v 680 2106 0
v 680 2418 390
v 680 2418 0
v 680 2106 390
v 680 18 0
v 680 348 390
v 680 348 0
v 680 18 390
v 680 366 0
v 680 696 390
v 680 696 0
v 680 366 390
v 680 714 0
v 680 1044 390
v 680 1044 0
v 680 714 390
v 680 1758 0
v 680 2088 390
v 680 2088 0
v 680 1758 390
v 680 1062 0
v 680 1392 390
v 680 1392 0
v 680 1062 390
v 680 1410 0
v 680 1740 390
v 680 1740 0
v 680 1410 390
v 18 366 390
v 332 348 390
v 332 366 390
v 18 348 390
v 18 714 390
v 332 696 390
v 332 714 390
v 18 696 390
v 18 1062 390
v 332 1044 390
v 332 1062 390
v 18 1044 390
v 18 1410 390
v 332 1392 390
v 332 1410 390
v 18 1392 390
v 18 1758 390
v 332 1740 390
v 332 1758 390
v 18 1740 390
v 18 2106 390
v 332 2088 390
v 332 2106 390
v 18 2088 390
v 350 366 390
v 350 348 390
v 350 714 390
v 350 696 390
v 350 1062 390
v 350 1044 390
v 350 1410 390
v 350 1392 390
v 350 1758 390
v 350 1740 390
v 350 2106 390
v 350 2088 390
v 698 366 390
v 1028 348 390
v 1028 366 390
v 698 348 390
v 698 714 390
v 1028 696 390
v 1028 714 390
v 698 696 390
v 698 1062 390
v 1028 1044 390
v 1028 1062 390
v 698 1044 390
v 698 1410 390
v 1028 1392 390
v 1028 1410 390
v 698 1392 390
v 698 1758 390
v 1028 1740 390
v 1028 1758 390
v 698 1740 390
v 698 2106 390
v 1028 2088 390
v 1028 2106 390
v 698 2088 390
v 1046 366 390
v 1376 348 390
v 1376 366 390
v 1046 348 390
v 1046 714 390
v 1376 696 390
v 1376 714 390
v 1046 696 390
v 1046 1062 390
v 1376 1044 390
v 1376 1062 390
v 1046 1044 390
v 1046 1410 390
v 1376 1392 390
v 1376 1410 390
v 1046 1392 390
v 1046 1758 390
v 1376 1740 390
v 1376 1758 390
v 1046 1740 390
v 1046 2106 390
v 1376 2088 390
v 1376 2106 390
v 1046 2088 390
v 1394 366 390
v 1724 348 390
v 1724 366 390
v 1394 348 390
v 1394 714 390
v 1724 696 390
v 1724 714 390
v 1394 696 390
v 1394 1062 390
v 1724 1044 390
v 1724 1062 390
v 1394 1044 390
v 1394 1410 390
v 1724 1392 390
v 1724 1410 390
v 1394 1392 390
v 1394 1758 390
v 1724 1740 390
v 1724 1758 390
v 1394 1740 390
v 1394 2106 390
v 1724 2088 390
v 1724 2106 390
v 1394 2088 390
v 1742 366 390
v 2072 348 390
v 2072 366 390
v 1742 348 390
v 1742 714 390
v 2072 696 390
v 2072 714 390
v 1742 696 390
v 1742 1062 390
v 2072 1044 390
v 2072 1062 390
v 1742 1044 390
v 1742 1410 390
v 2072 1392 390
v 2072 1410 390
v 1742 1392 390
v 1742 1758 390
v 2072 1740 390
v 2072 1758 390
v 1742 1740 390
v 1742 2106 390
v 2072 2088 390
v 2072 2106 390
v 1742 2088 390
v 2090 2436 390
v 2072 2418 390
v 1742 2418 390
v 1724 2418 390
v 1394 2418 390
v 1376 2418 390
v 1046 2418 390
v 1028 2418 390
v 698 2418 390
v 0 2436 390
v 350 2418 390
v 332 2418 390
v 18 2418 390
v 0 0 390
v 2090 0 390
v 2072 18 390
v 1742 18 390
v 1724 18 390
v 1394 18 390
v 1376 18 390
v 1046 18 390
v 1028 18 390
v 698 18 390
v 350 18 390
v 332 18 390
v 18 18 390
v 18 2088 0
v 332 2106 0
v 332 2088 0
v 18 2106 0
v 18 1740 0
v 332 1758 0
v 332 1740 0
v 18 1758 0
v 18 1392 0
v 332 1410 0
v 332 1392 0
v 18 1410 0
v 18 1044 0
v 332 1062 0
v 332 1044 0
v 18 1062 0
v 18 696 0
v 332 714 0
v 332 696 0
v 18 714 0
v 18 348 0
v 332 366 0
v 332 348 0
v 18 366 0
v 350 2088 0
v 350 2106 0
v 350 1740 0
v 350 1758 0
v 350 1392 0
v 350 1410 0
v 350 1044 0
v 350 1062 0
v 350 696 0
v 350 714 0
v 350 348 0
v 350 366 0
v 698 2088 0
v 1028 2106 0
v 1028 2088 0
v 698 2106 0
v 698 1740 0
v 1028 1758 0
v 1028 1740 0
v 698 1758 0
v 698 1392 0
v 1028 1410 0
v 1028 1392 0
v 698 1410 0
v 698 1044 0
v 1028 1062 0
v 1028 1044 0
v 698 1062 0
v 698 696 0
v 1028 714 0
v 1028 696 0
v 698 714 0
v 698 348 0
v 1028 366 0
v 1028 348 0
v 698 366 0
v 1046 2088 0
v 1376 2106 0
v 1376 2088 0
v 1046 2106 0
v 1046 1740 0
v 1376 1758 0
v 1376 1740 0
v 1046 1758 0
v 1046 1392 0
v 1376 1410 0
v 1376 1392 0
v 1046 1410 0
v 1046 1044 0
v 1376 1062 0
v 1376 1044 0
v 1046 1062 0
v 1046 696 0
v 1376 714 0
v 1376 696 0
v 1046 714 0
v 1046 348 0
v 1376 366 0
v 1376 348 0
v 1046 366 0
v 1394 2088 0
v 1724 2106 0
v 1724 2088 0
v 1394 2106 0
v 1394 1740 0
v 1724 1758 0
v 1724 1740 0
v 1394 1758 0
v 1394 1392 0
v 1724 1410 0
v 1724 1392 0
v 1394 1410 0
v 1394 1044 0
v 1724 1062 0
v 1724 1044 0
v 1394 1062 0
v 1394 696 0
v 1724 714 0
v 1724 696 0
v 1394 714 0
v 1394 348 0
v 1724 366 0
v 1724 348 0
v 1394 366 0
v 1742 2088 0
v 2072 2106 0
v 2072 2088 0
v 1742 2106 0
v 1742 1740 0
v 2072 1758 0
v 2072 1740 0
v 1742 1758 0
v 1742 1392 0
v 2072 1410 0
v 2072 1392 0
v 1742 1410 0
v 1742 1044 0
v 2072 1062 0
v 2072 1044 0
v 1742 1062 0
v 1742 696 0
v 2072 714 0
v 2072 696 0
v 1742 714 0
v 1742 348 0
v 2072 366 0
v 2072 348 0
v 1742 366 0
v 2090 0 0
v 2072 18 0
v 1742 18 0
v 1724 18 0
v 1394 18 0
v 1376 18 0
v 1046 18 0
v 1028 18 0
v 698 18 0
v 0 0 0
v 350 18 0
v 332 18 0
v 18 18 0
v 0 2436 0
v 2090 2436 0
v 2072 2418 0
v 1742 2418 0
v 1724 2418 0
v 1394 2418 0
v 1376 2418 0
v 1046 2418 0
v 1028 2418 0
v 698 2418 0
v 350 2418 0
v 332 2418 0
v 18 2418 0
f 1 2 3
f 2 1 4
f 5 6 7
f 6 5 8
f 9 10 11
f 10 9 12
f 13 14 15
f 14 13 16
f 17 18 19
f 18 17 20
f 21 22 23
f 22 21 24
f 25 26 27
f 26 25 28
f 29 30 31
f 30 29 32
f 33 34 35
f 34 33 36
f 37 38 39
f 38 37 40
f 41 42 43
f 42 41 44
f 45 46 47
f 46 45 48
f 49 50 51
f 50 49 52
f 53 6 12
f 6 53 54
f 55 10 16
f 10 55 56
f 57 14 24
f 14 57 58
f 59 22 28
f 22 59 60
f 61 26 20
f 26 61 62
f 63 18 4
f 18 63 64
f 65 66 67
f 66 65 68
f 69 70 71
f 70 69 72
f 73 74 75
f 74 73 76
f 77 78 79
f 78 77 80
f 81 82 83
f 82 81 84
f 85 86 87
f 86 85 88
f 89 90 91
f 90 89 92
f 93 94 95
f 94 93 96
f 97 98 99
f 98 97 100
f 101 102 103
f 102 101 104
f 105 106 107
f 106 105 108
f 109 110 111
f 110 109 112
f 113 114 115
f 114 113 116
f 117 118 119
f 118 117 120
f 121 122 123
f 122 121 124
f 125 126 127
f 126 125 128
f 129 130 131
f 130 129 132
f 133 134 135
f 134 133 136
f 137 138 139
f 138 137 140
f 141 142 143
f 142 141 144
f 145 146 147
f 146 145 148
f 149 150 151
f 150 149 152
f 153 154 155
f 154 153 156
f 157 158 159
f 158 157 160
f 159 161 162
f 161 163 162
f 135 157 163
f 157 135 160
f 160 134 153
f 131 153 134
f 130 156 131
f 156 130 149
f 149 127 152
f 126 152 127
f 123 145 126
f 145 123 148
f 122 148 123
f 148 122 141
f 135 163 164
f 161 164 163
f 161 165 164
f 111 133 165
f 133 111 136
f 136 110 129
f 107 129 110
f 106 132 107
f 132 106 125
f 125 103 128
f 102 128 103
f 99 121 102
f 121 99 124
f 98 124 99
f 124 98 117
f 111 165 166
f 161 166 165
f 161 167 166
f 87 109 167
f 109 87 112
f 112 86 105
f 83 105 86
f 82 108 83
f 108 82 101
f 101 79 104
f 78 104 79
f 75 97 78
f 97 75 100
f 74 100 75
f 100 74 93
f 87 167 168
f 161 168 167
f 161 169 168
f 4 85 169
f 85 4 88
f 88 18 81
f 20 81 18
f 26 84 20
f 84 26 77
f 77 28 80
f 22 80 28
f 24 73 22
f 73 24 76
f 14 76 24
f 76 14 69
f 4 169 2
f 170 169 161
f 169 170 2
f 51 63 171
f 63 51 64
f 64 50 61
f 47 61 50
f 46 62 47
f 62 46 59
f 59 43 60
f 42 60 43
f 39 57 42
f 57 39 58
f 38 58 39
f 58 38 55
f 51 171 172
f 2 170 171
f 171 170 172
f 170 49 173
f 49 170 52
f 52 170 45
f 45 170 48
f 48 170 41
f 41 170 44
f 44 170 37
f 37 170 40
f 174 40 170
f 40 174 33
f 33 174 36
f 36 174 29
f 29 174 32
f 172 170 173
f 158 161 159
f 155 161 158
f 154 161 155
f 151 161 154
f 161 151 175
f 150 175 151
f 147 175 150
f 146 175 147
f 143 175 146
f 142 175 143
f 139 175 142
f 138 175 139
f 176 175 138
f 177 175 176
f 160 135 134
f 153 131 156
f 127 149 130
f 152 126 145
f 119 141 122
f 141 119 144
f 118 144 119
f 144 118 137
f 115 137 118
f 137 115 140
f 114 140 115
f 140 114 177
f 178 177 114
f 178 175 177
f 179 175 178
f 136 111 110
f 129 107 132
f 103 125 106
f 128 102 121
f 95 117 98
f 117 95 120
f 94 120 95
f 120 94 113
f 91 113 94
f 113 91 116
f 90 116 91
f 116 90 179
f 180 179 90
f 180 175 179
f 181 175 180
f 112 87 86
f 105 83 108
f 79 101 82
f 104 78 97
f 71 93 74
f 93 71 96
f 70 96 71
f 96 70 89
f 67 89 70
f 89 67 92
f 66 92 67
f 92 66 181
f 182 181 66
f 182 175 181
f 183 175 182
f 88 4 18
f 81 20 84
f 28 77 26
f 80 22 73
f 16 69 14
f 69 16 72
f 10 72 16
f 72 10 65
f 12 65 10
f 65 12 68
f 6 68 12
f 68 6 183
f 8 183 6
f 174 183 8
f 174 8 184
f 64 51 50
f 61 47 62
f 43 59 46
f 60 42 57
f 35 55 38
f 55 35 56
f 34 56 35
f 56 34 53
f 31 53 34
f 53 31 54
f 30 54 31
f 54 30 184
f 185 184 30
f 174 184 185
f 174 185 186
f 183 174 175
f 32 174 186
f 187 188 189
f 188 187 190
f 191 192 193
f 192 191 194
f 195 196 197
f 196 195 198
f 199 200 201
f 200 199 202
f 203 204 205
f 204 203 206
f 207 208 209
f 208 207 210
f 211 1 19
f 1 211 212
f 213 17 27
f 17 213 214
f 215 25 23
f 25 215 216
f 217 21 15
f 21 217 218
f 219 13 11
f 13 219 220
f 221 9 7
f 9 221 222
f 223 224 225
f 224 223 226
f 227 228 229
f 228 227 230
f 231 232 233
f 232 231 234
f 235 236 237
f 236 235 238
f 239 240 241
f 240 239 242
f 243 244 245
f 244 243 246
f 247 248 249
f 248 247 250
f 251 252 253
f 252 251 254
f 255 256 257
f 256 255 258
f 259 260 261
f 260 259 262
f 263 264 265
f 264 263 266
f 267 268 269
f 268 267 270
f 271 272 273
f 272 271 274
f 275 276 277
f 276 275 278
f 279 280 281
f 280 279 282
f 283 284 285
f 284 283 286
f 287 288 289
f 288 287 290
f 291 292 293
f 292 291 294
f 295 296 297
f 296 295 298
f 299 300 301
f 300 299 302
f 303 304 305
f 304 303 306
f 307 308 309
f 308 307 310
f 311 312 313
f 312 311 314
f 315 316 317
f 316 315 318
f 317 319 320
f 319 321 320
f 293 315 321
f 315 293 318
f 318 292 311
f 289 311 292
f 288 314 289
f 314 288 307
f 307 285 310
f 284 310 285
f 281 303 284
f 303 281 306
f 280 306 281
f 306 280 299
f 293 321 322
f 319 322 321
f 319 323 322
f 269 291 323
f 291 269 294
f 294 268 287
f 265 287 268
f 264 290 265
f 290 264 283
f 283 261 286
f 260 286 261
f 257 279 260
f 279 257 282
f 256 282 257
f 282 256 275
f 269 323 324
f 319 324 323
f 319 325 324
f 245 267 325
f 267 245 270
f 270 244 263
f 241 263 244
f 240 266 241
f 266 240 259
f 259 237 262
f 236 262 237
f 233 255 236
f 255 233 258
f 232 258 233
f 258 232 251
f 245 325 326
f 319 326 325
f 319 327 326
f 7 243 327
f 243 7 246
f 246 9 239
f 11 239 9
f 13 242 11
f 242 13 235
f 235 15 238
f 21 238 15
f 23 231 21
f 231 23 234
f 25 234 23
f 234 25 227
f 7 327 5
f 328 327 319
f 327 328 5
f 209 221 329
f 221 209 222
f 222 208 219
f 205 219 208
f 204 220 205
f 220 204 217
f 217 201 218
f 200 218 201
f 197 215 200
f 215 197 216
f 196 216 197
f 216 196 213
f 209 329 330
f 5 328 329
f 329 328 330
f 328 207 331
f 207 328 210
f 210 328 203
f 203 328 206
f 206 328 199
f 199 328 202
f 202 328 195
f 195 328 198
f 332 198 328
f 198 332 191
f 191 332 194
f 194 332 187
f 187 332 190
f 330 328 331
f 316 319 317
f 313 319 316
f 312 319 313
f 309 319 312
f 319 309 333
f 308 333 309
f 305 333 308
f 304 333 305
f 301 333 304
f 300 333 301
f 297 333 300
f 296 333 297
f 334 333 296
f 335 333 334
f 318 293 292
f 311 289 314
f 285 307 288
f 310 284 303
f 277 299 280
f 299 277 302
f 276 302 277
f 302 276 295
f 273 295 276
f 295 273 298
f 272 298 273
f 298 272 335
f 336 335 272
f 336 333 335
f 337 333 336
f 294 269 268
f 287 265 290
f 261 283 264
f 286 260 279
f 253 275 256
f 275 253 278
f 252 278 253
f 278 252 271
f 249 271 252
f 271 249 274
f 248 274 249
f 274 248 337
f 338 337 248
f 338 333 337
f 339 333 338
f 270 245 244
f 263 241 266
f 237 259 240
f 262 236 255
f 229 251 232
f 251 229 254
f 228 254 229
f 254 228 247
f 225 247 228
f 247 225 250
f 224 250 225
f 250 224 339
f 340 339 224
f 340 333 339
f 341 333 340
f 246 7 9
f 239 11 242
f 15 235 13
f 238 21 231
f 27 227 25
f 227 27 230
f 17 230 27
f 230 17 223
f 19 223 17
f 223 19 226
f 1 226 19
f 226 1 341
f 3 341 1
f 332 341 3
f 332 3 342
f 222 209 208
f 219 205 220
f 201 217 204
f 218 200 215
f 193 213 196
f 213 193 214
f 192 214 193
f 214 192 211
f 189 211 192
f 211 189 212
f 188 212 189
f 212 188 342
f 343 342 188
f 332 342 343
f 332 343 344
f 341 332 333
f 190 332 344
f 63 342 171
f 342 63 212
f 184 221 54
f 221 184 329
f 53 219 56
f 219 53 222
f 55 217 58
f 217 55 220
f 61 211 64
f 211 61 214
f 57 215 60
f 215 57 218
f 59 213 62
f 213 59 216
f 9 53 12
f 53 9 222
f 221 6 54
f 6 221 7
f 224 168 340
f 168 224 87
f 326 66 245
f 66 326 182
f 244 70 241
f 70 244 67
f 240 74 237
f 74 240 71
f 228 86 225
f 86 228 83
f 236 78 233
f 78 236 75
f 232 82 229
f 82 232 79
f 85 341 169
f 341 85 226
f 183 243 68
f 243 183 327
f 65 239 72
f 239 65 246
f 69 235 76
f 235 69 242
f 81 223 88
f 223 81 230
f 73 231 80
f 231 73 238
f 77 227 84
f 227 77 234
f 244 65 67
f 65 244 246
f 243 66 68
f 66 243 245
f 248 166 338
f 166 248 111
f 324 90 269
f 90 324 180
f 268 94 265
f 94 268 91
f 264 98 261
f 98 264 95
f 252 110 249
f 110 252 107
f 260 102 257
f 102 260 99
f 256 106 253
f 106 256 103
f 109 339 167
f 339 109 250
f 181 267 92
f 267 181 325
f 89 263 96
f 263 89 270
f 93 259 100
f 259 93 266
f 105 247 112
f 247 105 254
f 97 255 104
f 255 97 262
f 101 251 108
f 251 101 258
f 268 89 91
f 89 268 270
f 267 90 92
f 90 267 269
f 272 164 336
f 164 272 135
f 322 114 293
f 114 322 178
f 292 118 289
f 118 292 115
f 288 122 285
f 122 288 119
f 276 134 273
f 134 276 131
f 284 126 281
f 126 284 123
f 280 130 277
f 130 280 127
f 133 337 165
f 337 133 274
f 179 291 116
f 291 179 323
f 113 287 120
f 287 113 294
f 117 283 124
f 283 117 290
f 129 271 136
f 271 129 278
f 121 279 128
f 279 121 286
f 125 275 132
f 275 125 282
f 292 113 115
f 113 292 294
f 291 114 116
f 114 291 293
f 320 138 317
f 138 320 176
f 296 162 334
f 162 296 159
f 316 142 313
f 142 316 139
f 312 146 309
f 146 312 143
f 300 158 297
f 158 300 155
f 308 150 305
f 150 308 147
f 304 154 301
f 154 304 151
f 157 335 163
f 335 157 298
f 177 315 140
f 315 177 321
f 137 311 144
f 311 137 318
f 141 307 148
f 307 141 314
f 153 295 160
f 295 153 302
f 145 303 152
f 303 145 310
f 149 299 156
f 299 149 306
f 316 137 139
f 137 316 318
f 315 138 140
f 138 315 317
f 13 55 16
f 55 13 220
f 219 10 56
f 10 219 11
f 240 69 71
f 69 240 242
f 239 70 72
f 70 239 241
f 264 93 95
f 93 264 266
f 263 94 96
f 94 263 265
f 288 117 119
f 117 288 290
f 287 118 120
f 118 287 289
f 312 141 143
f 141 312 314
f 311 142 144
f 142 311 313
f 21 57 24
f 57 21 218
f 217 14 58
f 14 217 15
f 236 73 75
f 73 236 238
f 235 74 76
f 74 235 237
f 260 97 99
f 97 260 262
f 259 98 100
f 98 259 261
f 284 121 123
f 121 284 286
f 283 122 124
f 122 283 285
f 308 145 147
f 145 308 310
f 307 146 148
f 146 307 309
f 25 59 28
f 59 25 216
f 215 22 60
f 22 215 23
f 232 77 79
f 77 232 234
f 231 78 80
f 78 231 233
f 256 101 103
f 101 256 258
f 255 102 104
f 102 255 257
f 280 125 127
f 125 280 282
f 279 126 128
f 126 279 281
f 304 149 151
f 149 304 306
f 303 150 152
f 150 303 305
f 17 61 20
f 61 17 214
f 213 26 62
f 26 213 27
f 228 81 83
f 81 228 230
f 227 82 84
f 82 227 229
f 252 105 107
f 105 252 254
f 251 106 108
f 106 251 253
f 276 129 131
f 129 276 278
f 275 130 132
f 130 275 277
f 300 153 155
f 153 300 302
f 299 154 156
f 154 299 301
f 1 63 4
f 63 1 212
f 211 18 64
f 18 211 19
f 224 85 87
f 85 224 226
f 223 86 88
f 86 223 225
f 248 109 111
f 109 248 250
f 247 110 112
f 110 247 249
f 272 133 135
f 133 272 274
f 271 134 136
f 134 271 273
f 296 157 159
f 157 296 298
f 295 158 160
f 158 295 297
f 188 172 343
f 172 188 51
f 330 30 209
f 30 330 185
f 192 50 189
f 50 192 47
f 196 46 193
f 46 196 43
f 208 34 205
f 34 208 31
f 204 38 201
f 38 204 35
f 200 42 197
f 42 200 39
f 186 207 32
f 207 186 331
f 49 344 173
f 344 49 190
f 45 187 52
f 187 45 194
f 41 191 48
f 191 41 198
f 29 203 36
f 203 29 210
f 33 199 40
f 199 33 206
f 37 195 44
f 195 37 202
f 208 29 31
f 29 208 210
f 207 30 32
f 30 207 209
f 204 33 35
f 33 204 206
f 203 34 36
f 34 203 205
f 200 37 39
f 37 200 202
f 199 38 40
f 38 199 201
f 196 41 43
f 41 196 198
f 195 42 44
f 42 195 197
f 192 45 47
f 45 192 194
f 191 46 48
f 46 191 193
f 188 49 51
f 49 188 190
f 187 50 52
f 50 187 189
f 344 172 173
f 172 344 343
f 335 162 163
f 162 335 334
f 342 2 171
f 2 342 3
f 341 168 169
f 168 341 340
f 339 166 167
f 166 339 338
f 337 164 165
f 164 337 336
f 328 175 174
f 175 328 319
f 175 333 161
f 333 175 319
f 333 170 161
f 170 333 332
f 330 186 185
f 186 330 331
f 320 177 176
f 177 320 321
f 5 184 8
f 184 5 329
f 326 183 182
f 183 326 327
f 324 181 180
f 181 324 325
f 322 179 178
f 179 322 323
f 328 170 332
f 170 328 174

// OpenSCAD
rowHeight = 18;
boxSize = 330;
depth = 390;

paddingLeft = 314;

rows = 7;
columuns = 6;

// Calculate horizontal size lenght
horizontalLenght = rowHeight+(boxSize*columuns)+(columuns-2)*rowHeight;
totalH = (paddingLeft == 0) ? horizontalLenght : (horizontalLenght - boxSize + paddingLeft);

// Calculate vertical size
totalV = rows*boxSize + (rows-1)*rowHeight;

// Horizontal top and bottom
translate([rowHeight, 0])
	cube([totalH, rowHeight, depth], false);
translate([rowHeight, totalV])
	cube([totalH, rowHeight, depth], false);
	
// Calculate the number of standard size plates
platesPerRow = (paddingLeft > 0) ? columuns - 1 : columuns;
// Horizontal
for ( row = [1 : rows-1] ) {
	// the first box is with different size if left padding is greater than 0
	startX = (paddingLeft > 0) ? paddingLeft+2*rowHeight : rowHeight;
	translate([rowHeight, (row*(boxSize+rowHeight))])
		// Custom plate if there is left padding
		if (paddingLeft > 0) {
			cube([paddingLeft, rowHeight, depth], false);
		}
		// Plates per row with the standard size
		if (platesPerRow > 0) {
			for ( box = [0 : platesPerRow-1] ) {
				translate([(startX+box*(boxSize+rowHeight)), (row*(boxSize+rowHeight))])
					cube([boxSize, rowHeight, depth], false);
			}
		}
	}

// Vertical columns
// The first vertical side
cube([rowHeight, totalV+rowHeight, depth], false);
// Next vertical sides
verticalStartX = (paddingLeft > 0) ? paddingLeft + rowHeight : boxSize + rowHeight;
for ( v = [0 : columuns-1] ) {
	colHeight = (v == columuns-1) ? totalV + rowHeight: totalV;
	colStartY = (v == columuns-1) ? 0: rowHeight;
    translate([verticalStartX+(v*(boxSize+rowHeight)), 0])
		cube([rowHeight, colHeight, depth], false);
}

// Calculate the total are and estimate min material pieces
area = (totalH*depth*2 + totalV*depth*(columuns+1)+boxSize*boxSize*rows*(columuns-1)+302*boxSize*rows);
material = 3660*1830;
materialCount = area/material;

echo("----------------------------------------");
echo("Rows: ", rows);
echo("Columns: ", columuns);
echo("Boxes: ", rows*columuns);
echo("----------------------------------------");
echo("Furniture width: ", totalH+(2*rowHeight));
// Total height is the vertical size + twice the material height
totalFurnitureHeight = totalV+2*rowHeight;
echo("Furniture height: ", totalV+2*rowHeight);
echo("Max furniture diagonal height: ", sqrt(totalFurnitureHeight*totalFurnitureHeight+depth*depth));
echo("----------------------------------------");
echo("Horizontal planes A", totalH, "x", depth, "mm: ", 2);
echo("Vertical planes sides ", totalV+2*rowHeight, "x", depth, "mm: ", 2);
echo("Vertical planes middle ", totalV, "x", depth, "mm: ", columuns-1);
echo("Horizontal planes B", boxSize, "x", depth, "mm: ", (rows-1)*(columuns-1));
echo("Horizontal planes C", paddingLeft, "x", depth, "mm: ", rows-1);
echo("----------------------------------------");
echo("Joint plates: ", ((columuns+1)*(rows-1)));
echo("Dowels: ", 2*((columuns+1)*(rows-1)));
// Couple of screws for each short side of each column and
// 3 screws for the joint plates
echo("Screws: ", 3*(columuns+1)+3*((columuns+1)*(rows-1)));
echo("----------------------------------------");
echo("Area: ", area, "mm2");
echo("Material count: ", materialCount);
echo("----------------------------------------");
